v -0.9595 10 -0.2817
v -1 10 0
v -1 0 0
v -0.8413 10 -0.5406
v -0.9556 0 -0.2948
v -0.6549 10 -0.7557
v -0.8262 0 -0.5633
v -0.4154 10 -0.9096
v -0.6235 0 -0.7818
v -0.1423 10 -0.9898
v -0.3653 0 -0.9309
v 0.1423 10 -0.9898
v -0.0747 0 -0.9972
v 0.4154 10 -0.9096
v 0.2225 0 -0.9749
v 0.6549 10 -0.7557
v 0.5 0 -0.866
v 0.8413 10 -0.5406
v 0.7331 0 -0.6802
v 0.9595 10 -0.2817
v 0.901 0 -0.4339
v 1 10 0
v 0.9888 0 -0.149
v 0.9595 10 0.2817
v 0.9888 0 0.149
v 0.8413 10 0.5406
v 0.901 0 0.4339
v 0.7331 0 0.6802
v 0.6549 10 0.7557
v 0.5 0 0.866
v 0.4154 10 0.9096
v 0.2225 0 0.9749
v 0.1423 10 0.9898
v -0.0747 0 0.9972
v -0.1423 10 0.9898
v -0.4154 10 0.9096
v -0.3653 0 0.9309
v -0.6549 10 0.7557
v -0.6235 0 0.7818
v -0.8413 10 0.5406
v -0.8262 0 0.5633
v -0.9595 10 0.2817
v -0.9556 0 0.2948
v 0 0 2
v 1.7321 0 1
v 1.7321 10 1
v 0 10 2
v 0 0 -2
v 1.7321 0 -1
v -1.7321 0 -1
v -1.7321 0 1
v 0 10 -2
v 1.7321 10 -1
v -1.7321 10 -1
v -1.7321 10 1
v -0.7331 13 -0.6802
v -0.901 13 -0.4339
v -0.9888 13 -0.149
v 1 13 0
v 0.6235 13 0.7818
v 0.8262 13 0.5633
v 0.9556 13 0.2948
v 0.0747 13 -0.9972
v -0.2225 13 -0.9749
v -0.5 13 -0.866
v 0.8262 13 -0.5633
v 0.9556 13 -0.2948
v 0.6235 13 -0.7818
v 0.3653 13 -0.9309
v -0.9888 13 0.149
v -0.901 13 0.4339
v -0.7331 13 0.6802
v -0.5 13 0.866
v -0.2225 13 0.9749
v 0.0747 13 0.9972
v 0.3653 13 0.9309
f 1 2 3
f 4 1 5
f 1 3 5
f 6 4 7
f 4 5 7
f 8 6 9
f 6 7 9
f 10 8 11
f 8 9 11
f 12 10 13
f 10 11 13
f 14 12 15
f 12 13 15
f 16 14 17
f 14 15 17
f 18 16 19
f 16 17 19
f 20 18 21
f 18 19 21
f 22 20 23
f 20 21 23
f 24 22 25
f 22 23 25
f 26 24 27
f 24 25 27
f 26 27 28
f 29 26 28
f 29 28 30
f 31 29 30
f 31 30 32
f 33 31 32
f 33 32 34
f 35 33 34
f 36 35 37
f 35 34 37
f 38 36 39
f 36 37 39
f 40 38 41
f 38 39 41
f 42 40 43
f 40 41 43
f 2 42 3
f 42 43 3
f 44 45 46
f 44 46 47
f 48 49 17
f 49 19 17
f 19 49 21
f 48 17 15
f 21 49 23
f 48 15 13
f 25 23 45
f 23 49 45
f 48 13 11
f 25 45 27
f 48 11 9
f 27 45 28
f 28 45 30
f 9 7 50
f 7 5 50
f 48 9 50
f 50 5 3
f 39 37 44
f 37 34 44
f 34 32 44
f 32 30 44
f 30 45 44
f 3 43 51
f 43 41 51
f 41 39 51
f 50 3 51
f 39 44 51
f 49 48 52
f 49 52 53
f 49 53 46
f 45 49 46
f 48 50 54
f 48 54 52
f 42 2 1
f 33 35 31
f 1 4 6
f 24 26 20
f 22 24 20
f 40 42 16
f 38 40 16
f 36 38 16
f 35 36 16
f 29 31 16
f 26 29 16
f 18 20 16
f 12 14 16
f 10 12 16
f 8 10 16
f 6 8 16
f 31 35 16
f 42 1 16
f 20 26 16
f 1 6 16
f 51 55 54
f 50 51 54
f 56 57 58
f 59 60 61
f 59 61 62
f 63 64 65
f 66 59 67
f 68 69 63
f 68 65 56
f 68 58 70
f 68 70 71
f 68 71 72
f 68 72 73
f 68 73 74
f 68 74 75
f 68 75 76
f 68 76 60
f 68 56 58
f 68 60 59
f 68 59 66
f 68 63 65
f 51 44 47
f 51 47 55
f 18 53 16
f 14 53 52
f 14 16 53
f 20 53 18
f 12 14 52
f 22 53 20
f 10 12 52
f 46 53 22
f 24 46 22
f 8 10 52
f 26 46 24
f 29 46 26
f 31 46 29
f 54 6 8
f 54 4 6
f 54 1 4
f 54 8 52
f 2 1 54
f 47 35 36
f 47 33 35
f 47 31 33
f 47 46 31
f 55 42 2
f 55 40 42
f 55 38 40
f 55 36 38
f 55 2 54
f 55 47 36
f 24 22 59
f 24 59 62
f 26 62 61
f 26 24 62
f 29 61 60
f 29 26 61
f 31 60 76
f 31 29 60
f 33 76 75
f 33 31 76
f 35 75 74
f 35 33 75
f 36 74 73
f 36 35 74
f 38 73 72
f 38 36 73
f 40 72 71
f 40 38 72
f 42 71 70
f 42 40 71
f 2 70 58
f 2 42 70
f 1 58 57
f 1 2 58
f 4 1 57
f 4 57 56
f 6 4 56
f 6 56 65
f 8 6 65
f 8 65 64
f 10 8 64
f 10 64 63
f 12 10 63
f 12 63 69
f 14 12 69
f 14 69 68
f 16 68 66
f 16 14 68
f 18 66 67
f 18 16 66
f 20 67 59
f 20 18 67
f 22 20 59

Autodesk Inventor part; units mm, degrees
ref_plane "YZ Plane" through (0, 0, 0) normal (1, 0, 0) x (0, 1, 0)
ref_plane "XZ Plane" through (0, 0, 0) normal (0, 1, 0) x (-1, 0, 0)
ref_plane "XY Plane" through (0, 0, 0) normal (0, 0, 1) x (1, 0, 0)
sketch "Sketch1" plane through (0, 0, 0) normal (0, 1, 0) x (-1, 0, 0)
  circle A0 centre (0, 0) radius 1
  line L0 (0, -2) -> (-1.7321, -1)
  line L1 (-1.7321, -1) -> (-1.7321, 1)
  line L2 (-1.7321, 1) -> (0, 2)
  line L3 (0, 2) -> (1.7321, 1)
  line L4 (1.7321, 1) -> (1.7321, -1)
  line L5 (1.7321, -1) -> (0, -2)
  dimension "d0" = 2
  dimension "d1" = 2
extrude "Extrusion1" add sketch "Sketch1" along normal blind 10
sketch "Sketch2" plane through (0, 10, 0) normal (0, 1, 0) x (1, 0, 0)
  circle A0 centre (0, 0) radius 1
extrude "Extrusion2" add sketch "Sketch2" along normal blind 3
thread "Thread1" size "M2x0.4" class "6g" standard "ANSI Metric M Profile" full length
thread "Thread2" size "M2x0.4" class "6H" standard "ANSI Metric M Profile" full length
properties part number "dist5mmM2" material "Brass, Soft Yellow"
